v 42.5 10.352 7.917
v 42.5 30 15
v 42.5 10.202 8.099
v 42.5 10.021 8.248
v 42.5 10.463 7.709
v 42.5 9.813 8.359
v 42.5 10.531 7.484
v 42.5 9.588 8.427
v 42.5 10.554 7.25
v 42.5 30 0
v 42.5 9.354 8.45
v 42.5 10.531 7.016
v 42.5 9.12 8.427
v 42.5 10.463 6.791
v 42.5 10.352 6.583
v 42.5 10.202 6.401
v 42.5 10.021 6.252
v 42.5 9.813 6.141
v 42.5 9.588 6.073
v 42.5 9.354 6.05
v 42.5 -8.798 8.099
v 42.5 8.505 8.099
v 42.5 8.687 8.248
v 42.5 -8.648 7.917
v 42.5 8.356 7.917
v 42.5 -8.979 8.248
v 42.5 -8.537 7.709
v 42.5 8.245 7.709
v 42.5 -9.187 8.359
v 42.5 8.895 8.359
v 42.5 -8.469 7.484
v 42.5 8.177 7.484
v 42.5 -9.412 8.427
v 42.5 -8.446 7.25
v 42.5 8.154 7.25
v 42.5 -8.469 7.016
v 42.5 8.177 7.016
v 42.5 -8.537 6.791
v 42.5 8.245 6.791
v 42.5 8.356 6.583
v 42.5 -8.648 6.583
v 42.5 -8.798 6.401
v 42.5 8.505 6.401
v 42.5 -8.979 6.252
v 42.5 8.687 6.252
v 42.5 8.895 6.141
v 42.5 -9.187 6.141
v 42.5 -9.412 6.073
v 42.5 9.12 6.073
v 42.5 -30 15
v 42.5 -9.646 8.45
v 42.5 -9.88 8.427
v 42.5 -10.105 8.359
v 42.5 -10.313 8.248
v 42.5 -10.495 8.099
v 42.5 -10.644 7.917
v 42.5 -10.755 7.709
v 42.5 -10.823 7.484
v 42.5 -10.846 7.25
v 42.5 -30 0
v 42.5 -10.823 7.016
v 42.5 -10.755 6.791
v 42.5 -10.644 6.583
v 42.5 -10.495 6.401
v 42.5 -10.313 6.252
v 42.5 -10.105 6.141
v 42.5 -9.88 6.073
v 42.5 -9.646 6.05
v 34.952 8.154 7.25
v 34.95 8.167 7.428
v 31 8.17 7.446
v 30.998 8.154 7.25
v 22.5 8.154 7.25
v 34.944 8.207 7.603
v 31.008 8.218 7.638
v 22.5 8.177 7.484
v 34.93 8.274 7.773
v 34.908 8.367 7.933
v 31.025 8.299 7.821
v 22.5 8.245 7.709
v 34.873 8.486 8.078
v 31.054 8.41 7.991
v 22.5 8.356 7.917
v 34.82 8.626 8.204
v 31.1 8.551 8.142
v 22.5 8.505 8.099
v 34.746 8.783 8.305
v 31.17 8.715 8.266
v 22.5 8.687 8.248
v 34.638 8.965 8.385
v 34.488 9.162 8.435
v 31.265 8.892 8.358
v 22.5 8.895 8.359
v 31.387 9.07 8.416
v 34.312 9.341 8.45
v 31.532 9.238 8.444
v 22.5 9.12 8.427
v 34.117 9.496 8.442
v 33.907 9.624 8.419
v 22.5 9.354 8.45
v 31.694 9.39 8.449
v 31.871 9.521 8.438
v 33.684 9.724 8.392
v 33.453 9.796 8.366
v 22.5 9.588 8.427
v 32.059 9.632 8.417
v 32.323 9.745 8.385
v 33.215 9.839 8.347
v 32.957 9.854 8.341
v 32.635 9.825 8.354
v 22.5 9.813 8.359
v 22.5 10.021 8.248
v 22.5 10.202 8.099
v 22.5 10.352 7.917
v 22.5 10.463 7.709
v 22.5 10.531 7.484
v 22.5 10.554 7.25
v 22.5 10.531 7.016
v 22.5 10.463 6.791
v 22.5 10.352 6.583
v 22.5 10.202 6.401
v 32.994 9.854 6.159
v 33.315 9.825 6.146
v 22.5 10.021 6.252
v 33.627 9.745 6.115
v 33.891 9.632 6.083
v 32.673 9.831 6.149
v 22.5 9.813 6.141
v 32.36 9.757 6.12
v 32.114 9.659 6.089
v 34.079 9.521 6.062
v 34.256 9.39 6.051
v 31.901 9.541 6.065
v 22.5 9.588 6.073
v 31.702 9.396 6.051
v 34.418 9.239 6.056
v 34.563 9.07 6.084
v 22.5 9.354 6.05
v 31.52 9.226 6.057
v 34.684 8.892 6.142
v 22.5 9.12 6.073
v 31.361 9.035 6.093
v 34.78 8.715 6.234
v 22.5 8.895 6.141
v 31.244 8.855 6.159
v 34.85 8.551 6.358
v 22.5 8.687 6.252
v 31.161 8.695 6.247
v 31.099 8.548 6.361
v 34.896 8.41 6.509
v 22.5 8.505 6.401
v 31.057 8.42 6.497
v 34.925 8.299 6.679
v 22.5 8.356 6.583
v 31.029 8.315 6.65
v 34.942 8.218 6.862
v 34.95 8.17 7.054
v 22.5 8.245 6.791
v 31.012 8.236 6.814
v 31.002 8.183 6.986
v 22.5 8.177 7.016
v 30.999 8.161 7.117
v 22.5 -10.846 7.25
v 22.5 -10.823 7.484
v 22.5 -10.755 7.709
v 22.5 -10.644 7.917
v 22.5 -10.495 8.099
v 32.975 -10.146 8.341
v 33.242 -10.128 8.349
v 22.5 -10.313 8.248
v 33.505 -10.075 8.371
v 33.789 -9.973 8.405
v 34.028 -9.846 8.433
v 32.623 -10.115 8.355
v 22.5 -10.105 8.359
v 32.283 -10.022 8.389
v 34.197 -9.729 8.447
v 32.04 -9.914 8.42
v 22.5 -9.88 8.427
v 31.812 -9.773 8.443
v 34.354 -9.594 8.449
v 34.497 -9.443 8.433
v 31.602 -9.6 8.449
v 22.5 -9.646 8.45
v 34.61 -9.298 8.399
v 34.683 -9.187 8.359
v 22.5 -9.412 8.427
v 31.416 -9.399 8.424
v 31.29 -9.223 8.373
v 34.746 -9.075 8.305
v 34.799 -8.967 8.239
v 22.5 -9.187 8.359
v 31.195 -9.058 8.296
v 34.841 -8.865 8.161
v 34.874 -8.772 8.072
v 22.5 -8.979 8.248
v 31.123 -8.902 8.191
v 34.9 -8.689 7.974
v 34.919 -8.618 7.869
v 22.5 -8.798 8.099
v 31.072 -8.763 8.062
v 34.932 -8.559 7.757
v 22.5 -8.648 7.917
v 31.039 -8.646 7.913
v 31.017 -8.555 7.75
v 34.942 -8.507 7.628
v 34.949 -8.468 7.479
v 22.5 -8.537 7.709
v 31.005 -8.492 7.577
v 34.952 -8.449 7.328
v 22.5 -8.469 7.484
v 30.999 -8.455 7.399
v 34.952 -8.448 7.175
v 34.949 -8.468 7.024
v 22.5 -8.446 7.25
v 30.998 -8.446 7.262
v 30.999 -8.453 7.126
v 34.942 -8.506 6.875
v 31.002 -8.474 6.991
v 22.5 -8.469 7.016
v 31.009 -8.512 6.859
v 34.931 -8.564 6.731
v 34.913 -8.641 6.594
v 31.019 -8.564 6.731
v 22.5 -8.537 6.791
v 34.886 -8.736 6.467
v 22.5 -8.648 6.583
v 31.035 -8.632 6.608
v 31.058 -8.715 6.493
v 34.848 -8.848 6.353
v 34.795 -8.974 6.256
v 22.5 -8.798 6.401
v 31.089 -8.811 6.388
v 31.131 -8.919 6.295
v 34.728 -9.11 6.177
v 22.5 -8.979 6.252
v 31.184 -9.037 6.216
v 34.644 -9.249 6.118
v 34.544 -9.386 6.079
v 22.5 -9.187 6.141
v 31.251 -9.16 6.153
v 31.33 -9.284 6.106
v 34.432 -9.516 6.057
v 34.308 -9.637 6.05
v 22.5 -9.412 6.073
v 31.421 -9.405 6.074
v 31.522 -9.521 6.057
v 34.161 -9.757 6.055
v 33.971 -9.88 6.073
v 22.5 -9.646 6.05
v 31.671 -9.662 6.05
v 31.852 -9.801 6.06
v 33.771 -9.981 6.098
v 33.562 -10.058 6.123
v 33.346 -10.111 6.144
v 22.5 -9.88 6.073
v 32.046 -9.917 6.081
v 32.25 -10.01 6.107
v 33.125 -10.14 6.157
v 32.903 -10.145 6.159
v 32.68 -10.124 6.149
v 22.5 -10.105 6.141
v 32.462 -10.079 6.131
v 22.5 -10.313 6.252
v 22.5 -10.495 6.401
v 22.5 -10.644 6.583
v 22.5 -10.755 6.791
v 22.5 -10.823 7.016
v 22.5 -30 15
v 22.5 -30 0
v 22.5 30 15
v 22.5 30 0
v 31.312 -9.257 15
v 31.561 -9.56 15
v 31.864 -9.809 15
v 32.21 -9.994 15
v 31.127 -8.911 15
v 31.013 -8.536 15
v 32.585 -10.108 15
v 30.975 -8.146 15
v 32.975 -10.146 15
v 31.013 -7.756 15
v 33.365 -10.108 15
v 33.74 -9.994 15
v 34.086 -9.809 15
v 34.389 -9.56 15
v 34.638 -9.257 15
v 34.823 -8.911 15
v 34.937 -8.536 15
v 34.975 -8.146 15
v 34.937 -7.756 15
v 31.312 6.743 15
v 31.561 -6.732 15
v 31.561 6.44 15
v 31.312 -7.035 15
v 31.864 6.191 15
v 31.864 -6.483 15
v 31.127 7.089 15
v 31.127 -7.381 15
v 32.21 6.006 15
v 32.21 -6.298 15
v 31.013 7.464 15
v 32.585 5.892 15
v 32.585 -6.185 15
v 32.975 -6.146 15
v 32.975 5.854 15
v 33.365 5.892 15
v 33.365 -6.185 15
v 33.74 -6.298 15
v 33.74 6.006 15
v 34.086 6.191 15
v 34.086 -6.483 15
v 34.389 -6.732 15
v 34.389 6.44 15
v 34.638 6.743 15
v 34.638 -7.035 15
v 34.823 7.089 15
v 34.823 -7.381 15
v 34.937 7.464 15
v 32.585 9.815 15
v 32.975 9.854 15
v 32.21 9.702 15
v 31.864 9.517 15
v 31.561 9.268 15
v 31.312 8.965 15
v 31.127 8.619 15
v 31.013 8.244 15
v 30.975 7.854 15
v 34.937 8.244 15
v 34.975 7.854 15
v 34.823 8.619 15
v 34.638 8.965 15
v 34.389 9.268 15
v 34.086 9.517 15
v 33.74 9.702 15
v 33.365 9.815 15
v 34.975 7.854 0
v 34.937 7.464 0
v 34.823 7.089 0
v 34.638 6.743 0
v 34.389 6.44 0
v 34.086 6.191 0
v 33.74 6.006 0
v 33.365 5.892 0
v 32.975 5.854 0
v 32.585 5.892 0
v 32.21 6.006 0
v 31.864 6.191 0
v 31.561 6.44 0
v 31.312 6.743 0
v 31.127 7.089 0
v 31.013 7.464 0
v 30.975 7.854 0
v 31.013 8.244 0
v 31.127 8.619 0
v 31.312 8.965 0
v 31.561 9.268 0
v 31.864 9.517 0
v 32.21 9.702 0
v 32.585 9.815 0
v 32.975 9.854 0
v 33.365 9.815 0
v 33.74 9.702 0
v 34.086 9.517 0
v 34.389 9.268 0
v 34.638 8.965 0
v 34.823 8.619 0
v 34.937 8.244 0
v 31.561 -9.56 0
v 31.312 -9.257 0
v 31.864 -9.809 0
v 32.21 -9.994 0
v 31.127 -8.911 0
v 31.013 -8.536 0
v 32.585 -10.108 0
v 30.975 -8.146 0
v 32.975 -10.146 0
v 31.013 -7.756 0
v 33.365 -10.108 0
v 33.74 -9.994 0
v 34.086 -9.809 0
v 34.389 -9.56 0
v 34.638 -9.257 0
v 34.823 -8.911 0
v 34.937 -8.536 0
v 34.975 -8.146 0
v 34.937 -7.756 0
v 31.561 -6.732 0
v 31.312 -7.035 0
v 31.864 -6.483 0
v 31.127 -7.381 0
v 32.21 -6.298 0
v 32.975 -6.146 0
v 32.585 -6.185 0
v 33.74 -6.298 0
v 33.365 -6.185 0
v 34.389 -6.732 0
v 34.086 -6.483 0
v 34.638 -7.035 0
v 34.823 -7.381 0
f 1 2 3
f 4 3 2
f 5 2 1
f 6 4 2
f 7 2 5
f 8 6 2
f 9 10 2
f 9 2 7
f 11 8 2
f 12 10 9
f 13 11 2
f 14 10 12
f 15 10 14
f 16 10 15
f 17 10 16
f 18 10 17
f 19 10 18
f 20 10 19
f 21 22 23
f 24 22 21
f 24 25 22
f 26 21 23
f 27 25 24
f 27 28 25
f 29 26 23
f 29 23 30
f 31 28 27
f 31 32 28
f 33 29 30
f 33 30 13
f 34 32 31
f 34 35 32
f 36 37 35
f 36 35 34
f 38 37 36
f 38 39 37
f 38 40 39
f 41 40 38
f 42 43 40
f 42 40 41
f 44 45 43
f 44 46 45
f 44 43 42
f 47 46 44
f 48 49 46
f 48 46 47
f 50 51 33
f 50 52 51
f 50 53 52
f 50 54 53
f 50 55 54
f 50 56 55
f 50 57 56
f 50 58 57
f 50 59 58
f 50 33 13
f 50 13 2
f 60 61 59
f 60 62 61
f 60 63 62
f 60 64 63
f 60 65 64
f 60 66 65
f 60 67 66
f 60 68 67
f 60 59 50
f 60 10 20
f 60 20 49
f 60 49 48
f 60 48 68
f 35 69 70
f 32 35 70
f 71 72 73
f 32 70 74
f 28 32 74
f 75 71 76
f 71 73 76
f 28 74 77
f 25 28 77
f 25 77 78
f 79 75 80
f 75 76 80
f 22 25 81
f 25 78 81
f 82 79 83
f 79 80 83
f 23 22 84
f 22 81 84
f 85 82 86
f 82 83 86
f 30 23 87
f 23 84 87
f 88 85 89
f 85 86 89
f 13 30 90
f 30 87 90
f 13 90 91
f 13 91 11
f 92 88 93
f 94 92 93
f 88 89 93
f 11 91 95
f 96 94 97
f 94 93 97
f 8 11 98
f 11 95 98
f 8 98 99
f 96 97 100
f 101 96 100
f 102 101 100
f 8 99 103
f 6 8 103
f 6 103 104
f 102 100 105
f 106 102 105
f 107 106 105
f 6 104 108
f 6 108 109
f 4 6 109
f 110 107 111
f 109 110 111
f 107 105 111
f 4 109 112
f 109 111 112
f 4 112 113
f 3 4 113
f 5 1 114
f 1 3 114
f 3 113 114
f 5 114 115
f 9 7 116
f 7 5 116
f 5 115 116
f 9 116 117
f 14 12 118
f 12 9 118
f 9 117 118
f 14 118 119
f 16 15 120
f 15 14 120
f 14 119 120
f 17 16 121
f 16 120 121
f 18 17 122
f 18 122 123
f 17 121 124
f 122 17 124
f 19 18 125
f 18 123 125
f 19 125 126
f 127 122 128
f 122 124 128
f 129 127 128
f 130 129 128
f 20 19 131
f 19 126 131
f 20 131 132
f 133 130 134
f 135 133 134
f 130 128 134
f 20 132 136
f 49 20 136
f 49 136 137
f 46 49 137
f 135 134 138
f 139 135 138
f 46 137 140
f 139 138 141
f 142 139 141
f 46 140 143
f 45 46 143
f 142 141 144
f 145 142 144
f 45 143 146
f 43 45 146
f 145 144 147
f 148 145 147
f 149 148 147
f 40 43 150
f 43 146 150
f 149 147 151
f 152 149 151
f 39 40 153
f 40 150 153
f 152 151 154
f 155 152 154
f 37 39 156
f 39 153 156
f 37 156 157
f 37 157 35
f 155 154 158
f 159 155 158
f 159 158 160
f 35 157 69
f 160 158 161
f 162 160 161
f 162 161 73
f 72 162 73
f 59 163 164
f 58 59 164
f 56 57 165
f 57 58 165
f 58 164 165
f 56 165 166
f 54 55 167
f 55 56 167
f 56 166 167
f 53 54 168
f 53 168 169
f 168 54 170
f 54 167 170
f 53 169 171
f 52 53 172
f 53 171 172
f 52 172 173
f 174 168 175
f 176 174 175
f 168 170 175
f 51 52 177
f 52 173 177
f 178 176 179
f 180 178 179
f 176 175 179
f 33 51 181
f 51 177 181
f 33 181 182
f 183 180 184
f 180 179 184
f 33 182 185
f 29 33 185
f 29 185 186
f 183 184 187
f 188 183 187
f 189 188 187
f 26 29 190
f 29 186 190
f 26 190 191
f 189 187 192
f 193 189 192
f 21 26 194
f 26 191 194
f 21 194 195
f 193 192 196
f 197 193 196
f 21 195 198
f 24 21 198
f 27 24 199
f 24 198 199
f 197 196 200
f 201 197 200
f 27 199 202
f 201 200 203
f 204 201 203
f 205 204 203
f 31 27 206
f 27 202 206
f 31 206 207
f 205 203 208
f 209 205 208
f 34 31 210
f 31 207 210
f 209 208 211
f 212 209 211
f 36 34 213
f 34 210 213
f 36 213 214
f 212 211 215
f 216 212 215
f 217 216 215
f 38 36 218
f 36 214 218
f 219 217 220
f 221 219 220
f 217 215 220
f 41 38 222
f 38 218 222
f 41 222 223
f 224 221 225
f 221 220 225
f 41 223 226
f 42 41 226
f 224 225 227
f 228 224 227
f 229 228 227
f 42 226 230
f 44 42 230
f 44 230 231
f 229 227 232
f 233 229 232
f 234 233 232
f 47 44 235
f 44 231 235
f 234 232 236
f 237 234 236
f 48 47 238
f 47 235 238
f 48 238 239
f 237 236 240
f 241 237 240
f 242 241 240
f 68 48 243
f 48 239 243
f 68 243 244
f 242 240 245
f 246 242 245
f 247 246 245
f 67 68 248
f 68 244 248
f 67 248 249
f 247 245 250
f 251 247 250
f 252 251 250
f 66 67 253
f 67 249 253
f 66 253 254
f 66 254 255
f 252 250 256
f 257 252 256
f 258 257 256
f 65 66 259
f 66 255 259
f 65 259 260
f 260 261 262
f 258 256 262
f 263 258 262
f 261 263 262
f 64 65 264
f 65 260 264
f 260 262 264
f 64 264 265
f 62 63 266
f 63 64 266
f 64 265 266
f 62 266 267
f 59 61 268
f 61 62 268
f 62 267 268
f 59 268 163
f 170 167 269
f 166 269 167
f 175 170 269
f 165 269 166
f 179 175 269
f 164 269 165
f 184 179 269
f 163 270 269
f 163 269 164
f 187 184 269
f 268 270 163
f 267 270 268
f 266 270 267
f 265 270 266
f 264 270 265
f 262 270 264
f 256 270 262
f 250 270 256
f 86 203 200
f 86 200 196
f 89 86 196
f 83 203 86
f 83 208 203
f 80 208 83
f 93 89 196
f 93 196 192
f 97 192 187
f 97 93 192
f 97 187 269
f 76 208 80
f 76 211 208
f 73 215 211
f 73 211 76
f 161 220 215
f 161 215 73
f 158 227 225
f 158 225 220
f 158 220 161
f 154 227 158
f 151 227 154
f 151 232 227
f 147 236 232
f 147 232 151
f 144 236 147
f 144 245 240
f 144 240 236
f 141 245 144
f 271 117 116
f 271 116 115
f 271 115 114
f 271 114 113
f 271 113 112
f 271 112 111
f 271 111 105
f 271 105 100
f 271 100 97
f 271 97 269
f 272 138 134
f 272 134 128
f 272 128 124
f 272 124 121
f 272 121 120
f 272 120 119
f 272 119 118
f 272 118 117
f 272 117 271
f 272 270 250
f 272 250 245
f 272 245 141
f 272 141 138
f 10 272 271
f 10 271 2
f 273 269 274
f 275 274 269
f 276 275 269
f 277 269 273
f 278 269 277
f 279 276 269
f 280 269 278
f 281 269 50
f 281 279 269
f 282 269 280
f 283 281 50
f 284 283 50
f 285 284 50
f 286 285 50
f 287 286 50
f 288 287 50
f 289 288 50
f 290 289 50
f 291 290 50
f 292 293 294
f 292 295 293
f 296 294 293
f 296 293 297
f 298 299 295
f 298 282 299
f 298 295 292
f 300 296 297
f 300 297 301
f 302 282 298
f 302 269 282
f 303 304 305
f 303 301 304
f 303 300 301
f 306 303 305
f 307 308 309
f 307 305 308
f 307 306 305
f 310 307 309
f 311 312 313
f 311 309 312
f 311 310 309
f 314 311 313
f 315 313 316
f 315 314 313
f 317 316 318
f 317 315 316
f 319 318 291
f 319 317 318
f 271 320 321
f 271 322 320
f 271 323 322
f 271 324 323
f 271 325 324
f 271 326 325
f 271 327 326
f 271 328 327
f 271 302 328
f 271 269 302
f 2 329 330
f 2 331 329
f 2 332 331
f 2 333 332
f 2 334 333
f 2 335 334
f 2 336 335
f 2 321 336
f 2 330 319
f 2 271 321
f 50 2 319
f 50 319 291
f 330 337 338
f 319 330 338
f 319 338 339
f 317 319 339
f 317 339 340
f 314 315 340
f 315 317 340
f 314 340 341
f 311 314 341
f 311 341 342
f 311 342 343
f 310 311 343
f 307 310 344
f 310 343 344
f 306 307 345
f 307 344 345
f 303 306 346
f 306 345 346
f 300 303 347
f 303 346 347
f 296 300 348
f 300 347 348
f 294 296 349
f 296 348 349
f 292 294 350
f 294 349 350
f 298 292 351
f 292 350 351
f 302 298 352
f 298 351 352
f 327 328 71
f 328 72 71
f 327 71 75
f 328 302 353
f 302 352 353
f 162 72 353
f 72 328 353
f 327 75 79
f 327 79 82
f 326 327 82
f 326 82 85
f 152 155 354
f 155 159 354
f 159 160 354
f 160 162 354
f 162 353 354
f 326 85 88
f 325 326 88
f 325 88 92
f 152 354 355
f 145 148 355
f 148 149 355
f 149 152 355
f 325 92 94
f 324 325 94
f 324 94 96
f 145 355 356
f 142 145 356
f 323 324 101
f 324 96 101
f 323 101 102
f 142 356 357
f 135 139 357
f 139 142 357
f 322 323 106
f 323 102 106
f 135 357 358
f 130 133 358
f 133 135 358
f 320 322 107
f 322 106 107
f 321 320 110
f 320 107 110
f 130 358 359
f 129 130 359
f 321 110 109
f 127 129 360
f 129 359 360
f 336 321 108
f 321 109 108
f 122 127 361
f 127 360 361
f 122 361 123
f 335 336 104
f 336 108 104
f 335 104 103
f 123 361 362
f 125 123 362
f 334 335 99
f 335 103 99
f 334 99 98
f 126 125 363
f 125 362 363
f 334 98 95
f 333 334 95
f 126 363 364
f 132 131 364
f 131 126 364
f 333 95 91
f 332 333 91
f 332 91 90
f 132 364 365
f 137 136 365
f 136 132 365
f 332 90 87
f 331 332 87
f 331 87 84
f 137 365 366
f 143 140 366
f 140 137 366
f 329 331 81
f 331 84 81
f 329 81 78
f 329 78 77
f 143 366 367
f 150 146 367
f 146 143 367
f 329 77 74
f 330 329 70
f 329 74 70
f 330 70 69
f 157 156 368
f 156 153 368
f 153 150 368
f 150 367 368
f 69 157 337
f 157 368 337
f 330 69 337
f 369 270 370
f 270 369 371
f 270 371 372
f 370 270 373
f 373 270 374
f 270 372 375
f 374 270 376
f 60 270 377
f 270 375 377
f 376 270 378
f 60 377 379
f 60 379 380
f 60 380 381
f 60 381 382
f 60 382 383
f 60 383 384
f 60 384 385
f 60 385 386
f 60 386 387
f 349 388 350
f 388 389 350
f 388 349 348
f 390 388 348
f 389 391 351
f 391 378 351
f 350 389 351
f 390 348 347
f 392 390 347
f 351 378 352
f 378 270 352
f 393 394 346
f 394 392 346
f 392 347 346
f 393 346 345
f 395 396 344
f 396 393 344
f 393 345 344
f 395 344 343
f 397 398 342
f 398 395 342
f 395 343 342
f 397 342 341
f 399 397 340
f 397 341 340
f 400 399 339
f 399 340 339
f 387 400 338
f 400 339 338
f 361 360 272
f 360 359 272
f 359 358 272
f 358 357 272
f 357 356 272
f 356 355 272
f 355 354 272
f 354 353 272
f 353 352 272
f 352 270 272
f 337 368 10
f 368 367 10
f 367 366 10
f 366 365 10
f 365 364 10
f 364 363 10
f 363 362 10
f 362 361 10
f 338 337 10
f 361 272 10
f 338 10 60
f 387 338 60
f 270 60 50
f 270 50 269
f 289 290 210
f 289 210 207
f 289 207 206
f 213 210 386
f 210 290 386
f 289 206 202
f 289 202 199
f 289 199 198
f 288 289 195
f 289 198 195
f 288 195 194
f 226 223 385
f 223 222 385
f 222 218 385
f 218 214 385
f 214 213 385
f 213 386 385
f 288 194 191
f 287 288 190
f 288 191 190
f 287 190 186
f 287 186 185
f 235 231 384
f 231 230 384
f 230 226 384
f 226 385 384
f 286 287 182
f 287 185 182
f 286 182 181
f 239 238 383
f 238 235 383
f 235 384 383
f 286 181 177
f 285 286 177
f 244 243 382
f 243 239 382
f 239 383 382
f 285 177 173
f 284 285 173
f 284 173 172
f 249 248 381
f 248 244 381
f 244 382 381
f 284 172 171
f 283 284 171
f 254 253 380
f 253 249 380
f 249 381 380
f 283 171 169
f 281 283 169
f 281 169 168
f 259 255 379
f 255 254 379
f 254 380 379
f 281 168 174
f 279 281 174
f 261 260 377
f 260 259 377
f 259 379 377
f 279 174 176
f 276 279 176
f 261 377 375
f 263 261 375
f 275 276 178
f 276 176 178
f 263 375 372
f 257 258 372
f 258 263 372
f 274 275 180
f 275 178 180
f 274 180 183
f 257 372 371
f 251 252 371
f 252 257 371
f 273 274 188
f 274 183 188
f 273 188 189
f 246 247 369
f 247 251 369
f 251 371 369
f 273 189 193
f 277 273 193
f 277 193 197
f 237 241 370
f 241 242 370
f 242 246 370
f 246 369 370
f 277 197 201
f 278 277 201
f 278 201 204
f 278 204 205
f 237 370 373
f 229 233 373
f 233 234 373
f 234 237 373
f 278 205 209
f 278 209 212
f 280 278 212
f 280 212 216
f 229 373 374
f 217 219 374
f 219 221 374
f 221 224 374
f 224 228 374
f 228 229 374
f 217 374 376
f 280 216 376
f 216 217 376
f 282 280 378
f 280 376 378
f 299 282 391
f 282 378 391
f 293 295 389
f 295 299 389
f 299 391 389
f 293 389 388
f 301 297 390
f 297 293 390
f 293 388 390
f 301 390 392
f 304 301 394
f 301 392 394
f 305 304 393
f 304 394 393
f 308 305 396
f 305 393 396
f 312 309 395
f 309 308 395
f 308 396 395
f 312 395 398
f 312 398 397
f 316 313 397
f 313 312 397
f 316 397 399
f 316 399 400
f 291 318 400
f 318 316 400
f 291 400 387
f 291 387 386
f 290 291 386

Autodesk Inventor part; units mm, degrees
ref_plane "YZ Plane" through (0, 0, 0) normal (1, 0, 0) x (0, 1, 0)
ref_plane "XZ Plane" through (0, 0, 0) normal (0, 1, 0) x (-1, 0, 0)
ref_plane "XY Plane" through (0, 0, 0) normal (0, 0, 1) x (1, 0, 0)
ref_plane "РабПлоскость1" through (0, 0, 0) normal (0, 0, 1) x (1, 0, 0)
sketch "Эскиз1" plane through (0, 0, 0) normal (0, 0, 1) x (1, 0, 0)
  circle A0 centre (32.975, 7.8539) radius 2 projected
  circle A1 centre (32.975, -8.1461) radius 2 projected
  line L0 (42.5, -30) -> (22.5, -30)
  line L1 (22.5, -30) -> (22.5, 30)
  line L2 (22.5, 30) -> (42.5, 30)
  line L3 (42.5, 30) -> (42.5, -30)
  line L4 (42.5, -30) -> (22.5, 30) construction
  line L5 (22.5, -30) -> (42.5, 30) construction
  point P0 (0, 0)
  point P1 (32.5, 0)
  point P2 (32.5, 0)
  dimension "d0" = 20
  dimension "d1" = 60
  dimension "d2" = 0
extrude "Выдавливание1" add sketch "Эскиз1" along normal blind 15
ref_plane "РабПлоскость2" through (22.5, -0.0677, -0.25) normal (1, 0, 0) x (0, -1, 0)
sketch "Эскиз2" plane through (22.5, -0.0677, -0.25) normal (1, 0, 0) x (0, -1, 0)
  circle A0 centre (-9.4216, -7.5) radius 1.2 projected
  circle A1 centre (9.5784, -7.5) radius 1.2 projected
  point P0 (-0.0677, -0.25)
extrude "Выдавливание2" cut sketch "Эскиз2" along normal up to surface (20 mm away)
properties part number "крепление"
